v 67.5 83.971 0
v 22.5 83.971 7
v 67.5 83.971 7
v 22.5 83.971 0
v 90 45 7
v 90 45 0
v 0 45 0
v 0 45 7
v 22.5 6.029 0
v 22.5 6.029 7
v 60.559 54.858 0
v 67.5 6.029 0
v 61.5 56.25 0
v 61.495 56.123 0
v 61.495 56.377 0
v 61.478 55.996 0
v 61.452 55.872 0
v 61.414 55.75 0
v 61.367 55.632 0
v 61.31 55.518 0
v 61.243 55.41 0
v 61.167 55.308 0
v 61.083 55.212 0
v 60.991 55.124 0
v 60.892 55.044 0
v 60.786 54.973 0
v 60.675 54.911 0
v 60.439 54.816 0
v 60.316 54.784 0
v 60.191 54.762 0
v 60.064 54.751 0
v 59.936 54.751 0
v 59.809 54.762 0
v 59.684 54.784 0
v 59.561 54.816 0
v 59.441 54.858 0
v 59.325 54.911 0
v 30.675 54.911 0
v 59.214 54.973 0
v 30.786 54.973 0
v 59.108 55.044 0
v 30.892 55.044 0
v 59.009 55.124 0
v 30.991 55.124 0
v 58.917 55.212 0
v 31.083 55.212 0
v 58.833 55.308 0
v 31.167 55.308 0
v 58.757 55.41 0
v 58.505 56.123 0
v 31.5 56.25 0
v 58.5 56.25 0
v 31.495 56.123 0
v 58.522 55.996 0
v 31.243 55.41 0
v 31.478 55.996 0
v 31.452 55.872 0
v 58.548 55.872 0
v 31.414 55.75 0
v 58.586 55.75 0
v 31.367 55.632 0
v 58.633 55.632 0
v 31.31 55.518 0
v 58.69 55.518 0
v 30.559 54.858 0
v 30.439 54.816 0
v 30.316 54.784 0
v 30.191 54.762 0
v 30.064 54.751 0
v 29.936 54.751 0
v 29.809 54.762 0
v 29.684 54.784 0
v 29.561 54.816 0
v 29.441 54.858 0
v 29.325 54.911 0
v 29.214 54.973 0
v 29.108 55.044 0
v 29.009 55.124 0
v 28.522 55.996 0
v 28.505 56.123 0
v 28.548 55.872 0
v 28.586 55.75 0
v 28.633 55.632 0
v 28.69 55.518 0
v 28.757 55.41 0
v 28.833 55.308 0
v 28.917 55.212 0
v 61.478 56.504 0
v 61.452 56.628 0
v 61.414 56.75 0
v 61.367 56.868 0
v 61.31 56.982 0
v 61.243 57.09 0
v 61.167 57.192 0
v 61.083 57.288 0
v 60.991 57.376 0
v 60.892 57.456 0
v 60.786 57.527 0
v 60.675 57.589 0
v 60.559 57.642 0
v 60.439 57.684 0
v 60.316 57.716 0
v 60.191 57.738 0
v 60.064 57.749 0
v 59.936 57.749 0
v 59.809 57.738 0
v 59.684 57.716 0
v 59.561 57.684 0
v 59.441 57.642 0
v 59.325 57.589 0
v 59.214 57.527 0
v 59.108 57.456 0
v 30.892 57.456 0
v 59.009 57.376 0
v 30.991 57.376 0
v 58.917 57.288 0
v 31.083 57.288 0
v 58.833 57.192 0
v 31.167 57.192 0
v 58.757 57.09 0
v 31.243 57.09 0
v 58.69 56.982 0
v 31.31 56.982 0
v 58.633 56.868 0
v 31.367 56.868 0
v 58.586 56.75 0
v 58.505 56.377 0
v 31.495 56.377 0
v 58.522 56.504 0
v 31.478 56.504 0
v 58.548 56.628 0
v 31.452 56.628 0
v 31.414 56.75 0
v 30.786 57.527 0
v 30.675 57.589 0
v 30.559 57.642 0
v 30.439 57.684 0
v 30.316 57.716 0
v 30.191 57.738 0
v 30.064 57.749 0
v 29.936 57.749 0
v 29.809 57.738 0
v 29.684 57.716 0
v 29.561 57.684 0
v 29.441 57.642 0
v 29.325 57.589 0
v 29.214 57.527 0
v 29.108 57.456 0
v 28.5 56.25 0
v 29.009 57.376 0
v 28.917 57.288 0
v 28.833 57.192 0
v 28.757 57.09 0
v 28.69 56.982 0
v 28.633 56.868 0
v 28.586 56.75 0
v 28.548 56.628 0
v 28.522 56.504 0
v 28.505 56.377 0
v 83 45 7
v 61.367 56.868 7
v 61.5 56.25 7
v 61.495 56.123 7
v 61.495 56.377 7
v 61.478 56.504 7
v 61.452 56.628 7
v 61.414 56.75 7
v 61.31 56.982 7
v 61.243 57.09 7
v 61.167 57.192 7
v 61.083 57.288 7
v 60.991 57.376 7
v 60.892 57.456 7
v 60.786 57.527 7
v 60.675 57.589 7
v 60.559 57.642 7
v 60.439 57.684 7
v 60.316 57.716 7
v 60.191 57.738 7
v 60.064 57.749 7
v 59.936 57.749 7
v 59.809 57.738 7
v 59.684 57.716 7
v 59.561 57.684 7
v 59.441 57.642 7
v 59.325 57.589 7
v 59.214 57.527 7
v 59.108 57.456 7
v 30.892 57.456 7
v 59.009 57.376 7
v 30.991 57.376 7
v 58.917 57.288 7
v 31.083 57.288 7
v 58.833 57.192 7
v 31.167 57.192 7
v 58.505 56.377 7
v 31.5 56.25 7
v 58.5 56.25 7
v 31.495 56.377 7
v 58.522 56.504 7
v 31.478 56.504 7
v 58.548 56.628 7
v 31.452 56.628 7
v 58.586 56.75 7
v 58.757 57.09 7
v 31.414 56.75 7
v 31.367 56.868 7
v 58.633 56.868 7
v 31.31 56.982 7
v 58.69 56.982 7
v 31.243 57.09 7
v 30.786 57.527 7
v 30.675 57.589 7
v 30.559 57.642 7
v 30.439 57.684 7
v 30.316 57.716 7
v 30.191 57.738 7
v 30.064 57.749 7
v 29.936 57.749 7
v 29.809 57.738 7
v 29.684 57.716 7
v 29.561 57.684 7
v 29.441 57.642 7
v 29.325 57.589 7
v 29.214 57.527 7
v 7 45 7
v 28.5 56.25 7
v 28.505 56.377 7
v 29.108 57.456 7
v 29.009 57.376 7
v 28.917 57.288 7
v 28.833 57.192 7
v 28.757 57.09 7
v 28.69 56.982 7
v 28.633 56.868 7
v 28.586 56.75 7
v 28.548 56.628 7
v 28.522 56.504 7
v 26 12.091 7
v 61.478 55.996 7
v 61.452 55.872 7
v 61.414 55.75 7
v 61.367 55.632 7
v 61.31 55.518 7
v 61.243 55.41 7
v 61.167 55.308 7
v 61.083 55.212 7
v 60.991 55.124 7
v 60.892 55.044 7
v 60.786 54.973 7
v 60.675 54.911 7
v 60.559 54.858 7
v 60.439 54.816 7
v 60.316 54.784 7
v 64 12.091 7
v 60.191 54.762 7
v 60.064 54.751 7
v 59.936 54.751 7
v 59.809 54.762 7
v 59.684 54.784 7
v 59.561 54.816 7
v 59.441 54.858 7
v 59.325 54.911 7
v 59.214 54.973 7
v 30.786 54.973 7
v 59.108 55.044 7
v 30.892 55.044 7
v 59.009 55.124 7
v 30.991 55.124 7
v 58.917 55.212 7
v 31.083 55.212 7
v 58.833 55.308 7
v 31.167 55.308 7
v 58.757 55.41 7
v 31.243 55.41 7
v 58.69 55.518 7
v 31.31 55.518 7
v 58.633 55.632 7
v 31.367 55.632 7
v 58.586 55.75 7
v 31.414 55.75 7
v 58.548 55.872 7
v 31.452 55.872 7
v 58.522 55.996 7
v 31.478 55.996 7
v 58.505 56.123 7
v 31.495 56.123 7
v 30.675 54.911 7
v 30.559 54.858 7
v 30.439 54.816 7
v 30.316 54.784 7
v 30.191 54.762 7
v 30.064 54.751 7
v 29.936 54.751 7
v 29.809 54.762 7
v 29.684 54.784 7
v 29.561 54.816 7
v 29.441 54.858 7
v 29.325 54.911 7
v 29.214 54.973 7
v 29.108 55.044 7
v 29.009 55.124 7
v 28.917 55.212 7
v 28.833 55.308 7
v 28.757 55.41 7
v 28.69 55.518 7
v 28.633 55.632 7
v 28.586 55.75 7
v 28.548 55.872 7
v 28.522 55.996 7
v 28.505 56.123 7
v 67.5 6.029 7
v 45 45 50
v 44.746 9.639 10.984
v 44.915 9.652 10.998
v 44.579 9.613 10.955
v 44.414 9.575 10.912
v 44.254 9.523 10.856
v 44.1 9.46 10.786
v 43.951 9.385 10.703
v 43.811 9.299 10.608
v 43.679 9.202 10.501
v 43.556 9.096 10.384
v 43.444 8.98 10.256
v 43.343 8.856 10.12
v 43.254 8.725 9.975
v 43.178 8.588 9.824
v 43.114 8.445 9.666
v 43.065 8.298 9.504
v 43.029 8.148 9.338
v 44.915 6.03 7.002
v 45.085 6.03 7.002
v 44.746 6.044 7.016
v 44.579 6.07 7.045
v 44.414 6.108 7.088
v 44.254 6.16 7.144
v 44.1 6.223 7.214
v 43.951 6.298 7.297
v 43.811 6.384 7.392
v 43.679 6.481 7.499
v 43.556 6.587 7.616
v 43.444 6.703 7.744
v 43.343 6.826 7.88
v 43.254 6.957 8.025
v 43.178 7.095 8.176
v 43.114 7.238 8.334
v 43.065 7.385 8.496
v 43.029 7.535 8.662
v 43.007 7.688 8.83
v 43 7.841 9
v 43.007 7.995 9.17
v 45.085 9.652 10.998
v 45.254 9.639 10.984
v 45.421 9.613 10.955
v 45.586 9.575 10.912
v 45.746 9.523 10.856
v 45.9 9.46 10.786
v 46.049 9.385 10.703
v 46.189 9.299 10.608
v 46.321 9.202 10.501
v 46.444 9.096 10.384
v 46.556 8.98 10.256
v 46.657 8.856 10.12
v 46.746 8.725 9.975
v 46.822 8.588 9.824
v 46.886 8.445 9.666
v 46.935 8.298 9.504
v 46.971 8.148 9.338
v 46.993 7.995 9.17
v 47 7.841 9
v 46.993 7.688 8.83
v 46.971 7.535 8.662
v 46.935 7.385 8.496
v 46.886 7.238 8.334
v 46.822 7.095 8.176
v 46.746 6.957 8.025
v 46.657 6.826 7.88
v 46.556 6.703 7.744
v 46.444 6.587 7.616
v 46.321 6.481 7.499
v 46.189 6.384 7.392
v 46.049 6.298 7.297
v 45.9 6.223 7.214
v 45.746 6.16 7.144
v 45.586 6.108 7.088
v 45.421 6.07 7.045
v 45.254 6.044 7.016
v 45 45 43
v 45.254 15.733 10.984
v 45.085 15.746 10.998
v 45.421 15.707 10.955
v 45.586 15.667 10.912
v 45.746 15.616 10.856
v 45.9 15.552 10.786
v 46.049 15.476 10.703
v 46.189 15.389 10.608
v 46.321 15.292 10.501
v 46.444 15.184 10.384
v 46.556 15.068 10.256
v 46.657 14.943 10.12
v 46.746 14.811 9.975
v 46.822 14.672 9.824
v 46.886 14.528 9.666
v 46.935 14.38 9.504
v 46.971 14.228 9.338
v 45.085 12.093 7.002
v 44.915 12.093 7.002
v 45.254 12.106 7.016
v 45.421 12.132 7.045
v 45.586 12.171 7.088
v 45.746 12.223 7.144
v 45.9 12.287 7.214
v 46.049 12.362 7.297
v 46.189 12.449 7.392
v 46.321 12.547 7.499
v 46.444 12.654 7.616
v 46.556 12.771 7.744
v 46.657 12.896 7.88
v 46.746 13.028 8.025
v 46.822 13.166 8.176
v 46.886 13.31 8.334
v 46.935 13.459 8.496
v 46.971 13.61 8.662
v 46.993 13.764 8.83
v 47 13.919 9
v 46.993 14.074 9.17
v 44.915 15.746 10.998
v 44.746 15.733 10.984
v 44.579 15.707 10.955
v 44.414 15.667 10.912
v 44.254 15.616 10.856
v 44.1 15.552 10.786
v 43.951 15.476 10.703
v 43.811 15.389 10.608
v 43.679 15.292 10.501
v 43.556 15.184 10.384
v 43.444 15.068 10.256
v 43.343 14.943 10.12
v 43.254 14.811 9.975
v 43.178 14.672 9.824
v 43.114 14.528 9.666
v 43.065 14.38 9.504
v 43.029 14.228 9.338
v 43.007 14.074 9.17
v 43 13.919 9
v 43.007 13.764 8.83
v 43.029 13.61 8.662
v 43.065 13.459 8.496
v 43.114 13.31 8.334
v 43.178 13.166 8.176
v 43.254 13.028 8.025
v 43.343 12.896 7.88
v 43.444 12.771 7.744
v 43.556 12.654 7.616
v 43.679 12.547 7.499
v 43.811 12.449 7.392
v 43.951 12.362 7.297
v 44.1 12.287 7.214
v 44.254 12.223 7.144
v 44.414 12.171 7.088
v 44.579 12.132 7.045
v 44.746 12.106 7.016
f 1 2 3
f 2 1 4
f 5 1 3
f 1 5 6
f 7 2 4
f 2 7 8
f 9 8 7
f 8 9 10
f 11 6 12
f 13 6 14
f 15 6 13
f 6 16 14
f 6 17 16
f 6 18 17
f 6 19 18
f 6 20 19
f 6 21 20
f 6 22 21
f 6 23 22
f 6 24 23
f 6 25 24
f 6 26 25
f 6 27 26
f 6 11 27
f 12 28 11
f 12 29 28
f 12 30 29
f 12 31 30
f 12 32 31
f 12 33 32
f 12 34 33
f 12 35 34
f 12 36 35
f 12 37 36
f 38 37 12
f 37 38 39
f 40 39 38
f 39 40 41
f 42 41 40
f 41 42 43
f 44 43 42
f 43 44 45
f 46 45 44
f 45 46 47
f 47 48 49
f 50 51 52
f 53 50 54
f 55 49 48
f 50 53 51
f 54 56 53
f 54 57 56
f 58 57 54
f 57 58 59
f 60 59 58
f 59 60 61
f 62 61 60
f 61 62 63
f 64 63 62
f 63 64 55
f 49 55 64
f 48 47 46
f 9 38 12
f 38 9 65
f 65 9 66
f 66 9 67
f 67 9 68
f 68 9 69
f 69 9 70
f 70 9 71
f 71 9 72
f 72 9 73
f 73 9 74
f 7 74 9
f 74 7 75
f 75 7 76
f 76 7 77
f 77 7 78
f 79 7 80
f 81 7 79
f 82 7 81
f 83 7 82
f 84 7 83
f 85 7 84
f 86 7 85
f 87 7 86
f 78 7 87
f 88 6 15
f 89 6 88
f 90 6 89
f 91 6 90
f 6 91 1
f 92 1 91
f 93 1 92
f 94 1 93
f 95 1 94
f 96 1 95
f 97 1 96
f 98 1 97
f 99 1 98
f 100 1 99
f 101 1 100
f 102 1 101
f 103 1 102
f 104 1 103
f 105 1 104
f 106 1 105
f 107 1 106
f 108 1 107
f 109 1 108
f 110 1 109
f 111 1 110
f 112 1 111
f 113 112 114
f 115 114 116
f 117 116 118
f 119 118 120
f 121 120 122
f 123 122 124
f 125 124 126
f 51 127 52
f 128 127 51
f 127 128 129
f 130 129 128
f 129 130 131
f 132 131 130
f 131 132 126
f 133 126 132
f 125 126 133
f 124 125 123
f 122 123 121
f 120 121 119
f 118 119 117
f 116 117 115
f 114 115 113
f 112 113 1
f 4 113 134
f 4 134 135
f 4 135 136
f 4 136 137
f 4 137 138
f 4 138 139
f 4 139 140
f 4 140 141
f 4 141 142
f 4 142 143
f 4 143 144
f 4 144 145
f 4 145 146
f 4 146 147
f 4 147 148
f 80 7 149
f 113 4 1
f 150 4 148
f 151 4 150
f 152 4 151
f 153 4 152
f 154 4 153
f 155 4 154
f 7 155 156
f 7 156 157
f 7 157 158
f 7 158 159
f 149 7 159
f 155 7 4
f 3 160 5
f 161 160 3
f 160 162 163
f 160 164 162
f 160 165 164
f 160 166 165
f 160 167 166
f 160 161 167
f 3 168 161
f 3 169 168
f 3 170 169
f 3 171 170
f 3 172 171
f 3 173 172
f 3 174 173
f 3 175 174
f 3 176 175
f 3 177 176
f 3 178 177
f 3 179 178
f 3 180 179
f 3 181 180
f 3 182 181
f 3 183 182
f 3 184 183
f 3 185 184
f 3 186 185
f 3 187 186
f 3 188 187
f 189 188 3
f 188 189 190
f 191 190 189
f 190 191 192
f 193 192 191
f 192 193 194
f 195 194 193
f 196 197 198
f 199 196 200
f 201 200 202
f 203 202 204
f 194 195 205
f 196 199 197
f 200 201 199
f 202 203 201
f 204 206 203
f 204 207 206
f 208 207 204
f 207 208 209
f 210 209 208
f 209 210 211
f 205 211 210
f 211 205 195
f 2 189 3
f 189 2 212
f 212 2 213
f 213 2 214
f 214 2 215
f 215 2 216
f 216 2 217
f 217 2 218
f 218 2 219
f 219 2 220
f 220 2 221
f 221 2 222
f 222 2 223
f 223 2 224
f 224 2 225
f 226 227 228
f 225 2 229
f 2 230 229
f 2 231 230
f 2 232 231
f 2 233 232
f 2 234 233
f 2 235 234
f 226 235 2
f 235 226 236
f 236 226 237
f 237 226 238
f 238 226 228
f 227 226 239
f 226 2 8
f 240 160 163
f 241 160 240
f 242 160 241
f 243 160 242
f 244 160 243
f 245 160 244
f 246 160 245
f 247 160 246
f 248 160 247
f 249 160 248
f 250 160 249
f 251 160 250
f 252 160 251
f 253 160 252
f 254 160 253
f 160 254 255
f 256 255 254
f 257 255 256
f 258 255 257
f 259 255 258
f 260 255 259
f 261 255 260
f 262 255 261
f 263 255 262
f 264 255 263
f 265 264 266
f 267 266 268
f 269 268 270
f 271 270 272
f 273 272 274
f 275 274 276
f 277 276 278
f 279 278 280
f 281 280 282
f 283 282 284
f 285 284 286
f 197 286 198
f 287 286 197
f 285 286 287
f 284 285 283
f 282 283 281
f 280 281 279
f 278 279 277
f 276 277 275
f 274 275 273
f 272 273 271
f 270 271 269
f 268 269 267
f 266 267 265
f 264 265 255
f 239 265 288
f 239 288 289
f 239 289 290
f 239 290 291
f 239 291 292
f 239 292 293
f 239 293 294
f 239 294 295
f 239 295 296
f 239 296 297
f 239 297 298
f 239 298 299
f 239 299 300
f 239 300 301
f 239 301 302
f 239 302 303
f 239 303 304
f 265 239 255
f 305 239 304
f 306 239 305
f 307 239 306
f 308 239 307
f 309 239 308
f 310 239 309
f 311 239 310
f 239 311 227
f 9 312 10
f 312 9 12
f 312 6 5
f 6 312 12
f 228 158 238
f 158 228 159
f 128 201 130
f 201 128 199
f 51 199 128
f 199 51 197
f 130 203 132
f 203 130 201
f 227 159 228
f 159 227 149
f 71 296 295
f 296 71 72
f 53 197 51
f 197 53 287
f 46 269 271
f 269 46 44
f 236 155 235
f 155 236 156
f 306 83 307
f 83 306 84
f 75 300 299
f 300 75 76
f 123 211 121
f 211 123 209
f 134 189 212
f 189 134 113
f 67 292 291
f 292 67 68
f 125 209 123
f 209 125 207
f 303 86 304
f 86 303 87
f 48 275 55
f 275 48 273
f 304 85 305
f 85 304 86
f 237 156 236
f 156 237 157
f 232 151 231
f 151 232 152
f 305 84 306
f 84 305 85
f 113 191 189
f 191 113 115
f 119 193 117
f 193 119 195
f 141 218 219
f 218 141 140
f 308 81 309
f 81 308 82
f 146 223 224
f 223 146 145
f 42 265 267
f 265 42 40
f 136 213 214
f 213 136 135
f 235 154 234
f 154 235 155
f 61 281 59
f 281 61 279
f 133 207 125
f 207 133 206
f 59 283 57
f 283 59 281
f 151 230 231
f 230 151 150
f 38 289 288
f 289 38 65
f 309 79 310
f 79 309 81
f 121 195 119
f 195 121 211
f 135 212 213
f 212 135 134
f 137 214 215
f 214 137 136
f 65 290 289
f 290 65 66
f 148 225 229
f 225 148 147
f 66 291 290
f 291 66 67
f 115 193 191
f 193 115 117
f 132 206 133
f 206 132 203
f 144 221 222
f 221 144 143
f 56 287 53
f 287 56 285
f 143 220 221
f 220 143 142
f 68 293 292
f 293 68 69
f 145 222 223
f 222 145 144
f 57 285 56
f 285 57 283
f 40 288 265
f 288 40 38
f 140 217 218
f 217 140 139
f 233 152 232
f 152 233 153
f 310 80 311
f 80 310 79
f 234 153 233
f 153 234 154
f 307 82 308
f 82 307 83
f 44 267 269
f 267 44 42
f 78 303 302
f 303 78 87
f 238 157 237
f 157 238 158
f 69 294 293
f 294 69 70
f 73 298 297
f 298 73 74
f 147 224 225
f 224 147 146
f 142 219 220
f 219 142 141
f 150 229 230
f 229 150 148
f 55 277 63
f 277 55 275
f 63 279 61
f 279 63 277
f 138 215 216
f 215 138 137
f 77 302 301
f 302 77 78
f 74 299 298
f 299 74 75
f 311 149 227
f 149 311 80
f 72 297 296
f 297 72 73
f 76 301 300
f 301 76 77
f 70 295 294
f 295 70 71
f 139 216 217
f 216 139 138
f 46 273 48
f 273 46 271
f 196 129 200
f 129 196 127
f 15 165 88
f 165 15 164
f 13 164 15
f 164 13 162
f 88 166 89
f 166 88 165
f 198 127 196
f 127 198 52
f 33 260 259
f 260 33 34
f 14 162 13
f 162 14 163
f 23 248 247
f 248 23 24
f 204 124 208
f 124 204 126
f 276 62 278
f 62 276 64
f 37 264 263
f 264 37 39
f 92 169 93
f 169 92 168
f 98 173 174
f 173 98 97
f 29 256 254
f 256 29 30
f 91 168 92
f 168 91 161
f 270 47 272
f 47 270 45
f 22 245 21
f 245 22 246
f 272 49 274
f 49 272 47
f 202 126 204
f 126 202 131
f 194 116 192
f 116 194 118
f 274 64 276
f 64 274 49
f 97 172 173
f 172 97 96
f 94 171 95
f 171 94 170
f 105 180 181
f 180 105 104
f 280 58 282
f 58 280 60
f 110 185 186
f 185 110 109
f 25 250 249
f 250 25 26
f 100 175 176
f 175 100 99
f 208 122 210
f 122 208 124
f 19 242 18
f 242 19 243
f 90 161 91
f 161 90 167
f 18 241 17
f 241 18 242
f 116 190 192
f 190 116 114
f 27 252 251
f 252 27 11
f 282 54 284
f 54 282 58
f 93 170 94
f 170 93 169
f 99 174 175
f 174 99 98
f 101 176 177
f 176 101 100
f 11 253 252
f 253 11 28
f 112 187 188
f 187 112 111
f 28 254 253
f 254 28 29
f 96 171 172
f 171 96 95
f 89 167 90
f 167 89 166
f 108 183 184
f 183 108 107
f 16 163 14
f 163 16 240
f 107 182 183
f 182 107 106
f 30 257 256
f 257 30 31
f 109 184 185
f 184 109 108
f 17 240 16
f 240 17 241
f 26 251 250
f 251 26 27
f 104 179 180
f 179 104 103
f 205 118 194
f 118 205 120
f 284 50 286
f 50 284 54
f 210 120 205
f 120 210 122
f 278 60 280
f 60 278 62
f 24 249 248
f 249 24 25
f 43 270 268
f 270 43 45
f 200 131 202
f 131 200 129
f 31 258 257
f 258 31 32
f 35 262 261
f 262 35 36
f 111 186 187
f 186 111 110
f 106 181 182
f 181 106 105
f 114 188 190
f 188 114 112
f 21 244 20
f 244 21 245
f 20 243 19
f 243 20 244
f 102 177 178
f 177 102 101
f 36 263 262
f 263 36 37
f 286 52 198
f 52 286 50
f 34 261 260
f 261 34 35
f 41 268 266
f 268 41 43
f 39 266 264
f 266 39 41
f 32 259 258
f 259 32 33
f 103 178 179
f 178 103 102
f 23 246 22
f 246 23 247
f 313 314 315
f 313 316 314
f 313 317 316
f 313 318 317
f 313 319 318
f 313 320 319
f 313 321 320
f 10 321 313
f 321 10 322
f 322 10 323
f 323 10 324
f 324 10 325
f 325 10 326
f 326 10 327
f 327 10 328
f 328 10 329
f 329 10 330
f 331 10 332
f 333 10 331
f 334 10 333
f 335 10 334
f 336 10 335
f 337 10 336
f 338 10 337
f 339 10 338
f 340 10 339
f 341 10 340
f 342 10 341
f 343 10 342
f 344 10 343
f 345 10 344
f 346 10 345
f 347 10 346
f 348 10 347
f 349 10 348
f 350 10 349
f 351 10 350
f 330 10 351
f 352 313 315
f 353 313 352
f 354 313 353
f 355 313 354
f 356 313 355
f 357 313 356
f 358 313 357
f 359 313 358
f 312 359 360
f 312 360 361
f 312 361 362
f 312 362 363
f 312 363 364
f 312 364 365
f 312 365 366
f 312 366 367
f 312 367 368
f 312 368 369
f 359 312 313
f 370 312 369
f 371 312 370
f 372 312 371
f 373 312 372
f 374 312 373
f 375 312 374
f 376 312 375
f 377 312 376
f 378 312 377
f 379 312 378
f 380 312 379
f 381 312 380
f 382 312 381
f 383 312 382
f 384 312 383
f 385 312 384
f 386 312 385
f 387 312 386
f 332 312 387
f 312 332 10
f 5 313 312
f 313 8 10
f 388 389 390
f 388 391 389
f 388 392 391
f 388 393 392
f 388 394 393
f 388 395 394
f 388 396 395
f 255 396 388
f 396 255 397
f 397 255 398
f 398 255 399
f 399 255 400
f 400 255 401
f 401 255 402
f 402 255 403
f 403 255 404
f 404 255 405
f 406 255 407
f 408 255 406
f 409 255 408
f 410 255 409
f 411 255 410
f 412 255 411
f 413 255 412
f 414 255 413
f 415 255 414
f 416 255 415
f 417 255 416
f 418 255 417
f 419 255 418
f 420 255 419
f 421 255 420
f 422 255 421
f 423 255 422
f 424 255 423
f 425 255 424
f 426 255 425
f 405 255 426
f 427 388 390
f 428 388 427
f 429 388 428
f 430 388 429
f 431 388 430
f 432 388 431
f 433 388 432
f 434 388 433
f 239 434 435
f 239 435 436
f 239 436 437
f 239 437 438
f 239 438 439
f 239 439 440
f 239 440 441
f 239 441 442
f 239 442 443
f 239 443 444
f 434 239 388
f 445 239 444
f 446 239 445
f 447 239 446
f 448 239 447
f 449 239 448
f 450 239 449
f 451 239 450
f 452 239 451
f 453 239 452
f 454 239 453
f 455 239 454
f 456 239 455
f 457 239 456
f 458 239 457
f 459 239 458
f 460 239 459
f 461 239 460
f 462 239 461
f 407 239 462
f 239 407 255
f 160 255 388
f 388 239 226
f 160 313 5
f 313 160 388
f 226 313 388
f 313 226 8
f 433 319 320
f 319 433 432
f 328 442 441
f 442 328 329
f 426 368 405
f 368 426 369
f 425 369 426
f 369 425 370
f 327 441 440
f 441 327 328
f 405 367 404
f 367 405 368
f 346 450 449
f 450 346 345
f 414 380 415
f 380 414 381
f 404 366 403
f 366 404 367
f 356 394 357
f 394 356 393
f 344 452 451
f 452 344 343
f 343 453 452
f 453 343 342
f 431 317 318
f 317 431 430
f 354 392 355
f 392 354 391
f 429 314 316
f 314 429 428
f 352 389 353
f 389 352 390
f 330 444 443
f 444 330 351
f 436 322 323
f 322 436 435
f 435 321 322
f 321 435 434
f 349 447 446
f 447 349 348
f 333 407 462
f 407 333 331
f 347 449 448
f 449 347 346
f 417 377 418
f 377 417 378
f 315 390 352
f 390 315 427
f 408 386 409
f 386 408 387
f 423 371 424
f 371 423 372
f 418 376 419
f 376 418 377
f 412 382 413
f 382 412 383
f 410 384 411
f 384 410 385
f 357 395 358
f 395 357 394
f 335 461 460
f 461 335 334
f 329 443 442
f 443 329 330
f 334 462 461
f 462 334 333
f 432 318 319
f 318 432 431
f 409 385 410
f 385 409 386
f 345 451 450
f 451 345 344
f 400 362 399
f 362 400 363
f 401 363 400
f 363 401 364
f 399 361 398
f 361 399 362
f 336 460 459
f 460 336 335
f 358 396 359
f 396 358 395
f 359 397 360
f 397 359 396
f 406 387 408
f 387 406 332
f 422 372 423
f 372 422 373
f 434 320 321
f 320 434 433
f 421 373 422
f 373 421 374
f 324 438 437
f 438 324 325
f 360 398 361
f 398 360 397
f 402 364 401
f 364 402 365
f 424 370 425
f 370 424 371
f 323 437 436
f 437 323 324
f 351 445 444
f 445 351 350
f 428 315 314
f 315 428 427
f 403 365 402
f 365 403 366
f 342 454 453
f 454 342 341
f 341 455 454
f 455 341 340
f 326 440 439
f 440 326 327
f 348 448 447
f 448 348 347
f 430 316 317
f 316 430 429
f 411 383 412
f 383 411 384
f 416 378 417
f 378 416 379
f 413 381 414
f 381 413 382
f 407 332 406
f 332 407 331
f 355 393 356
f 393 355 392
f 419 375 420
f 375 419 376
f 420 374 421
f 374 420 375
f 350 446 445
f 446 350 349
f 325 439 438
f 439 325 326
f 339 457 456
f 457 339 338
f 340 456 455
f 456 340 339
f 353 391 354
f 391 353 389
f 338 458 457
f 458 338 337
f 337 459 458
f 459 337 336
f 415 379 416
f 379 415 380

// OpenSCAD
////////////
x= 90;
z = 50;
dist_pared =7;
hoyo_agua = 4; // diametro
/////////////
hoyos = 3; // diametro

p1 = [x/2,(x/2),0];
j = x /3;
k =x/8 ;
p2 =[j,x/2+k,-1];
p3=[x-j,x/2+k,-1];

p4=[x/2,x/2,dist_pared];

p5=[-3,x/2,dist_pared-3];

p6=[x/2,x/2,dist_pared+(hoyo_agua/2)];

$fn = 74;


/// exagon
difference()
{
translate(p1)
color("blue")
cylinder(h = dist_pared ,d =x,$fn =6);

translate(p2)  
cylinder(h =dist_pared+3, d=hoyos  ); 
   
translate(p3)  
cylinder(h =dist_pared+3, d=hoyos  ); 
}
/// triangulo
difference()
{
translate(p4)
cylinder(z-dist_pared,x/2,00,$fn=6);
    
translate(p4)
color("red")
cylinder(z-(dist_pared*2),(x/2)-dist_pared,00,$fn=6);
    
translate(p5)
cube([x+6,x/2,z]); 
 /// agua 
translate(p6)  
rotate([90,0,0])
cylinder(h =x/2, d=hoyo_agua  ); 
}
